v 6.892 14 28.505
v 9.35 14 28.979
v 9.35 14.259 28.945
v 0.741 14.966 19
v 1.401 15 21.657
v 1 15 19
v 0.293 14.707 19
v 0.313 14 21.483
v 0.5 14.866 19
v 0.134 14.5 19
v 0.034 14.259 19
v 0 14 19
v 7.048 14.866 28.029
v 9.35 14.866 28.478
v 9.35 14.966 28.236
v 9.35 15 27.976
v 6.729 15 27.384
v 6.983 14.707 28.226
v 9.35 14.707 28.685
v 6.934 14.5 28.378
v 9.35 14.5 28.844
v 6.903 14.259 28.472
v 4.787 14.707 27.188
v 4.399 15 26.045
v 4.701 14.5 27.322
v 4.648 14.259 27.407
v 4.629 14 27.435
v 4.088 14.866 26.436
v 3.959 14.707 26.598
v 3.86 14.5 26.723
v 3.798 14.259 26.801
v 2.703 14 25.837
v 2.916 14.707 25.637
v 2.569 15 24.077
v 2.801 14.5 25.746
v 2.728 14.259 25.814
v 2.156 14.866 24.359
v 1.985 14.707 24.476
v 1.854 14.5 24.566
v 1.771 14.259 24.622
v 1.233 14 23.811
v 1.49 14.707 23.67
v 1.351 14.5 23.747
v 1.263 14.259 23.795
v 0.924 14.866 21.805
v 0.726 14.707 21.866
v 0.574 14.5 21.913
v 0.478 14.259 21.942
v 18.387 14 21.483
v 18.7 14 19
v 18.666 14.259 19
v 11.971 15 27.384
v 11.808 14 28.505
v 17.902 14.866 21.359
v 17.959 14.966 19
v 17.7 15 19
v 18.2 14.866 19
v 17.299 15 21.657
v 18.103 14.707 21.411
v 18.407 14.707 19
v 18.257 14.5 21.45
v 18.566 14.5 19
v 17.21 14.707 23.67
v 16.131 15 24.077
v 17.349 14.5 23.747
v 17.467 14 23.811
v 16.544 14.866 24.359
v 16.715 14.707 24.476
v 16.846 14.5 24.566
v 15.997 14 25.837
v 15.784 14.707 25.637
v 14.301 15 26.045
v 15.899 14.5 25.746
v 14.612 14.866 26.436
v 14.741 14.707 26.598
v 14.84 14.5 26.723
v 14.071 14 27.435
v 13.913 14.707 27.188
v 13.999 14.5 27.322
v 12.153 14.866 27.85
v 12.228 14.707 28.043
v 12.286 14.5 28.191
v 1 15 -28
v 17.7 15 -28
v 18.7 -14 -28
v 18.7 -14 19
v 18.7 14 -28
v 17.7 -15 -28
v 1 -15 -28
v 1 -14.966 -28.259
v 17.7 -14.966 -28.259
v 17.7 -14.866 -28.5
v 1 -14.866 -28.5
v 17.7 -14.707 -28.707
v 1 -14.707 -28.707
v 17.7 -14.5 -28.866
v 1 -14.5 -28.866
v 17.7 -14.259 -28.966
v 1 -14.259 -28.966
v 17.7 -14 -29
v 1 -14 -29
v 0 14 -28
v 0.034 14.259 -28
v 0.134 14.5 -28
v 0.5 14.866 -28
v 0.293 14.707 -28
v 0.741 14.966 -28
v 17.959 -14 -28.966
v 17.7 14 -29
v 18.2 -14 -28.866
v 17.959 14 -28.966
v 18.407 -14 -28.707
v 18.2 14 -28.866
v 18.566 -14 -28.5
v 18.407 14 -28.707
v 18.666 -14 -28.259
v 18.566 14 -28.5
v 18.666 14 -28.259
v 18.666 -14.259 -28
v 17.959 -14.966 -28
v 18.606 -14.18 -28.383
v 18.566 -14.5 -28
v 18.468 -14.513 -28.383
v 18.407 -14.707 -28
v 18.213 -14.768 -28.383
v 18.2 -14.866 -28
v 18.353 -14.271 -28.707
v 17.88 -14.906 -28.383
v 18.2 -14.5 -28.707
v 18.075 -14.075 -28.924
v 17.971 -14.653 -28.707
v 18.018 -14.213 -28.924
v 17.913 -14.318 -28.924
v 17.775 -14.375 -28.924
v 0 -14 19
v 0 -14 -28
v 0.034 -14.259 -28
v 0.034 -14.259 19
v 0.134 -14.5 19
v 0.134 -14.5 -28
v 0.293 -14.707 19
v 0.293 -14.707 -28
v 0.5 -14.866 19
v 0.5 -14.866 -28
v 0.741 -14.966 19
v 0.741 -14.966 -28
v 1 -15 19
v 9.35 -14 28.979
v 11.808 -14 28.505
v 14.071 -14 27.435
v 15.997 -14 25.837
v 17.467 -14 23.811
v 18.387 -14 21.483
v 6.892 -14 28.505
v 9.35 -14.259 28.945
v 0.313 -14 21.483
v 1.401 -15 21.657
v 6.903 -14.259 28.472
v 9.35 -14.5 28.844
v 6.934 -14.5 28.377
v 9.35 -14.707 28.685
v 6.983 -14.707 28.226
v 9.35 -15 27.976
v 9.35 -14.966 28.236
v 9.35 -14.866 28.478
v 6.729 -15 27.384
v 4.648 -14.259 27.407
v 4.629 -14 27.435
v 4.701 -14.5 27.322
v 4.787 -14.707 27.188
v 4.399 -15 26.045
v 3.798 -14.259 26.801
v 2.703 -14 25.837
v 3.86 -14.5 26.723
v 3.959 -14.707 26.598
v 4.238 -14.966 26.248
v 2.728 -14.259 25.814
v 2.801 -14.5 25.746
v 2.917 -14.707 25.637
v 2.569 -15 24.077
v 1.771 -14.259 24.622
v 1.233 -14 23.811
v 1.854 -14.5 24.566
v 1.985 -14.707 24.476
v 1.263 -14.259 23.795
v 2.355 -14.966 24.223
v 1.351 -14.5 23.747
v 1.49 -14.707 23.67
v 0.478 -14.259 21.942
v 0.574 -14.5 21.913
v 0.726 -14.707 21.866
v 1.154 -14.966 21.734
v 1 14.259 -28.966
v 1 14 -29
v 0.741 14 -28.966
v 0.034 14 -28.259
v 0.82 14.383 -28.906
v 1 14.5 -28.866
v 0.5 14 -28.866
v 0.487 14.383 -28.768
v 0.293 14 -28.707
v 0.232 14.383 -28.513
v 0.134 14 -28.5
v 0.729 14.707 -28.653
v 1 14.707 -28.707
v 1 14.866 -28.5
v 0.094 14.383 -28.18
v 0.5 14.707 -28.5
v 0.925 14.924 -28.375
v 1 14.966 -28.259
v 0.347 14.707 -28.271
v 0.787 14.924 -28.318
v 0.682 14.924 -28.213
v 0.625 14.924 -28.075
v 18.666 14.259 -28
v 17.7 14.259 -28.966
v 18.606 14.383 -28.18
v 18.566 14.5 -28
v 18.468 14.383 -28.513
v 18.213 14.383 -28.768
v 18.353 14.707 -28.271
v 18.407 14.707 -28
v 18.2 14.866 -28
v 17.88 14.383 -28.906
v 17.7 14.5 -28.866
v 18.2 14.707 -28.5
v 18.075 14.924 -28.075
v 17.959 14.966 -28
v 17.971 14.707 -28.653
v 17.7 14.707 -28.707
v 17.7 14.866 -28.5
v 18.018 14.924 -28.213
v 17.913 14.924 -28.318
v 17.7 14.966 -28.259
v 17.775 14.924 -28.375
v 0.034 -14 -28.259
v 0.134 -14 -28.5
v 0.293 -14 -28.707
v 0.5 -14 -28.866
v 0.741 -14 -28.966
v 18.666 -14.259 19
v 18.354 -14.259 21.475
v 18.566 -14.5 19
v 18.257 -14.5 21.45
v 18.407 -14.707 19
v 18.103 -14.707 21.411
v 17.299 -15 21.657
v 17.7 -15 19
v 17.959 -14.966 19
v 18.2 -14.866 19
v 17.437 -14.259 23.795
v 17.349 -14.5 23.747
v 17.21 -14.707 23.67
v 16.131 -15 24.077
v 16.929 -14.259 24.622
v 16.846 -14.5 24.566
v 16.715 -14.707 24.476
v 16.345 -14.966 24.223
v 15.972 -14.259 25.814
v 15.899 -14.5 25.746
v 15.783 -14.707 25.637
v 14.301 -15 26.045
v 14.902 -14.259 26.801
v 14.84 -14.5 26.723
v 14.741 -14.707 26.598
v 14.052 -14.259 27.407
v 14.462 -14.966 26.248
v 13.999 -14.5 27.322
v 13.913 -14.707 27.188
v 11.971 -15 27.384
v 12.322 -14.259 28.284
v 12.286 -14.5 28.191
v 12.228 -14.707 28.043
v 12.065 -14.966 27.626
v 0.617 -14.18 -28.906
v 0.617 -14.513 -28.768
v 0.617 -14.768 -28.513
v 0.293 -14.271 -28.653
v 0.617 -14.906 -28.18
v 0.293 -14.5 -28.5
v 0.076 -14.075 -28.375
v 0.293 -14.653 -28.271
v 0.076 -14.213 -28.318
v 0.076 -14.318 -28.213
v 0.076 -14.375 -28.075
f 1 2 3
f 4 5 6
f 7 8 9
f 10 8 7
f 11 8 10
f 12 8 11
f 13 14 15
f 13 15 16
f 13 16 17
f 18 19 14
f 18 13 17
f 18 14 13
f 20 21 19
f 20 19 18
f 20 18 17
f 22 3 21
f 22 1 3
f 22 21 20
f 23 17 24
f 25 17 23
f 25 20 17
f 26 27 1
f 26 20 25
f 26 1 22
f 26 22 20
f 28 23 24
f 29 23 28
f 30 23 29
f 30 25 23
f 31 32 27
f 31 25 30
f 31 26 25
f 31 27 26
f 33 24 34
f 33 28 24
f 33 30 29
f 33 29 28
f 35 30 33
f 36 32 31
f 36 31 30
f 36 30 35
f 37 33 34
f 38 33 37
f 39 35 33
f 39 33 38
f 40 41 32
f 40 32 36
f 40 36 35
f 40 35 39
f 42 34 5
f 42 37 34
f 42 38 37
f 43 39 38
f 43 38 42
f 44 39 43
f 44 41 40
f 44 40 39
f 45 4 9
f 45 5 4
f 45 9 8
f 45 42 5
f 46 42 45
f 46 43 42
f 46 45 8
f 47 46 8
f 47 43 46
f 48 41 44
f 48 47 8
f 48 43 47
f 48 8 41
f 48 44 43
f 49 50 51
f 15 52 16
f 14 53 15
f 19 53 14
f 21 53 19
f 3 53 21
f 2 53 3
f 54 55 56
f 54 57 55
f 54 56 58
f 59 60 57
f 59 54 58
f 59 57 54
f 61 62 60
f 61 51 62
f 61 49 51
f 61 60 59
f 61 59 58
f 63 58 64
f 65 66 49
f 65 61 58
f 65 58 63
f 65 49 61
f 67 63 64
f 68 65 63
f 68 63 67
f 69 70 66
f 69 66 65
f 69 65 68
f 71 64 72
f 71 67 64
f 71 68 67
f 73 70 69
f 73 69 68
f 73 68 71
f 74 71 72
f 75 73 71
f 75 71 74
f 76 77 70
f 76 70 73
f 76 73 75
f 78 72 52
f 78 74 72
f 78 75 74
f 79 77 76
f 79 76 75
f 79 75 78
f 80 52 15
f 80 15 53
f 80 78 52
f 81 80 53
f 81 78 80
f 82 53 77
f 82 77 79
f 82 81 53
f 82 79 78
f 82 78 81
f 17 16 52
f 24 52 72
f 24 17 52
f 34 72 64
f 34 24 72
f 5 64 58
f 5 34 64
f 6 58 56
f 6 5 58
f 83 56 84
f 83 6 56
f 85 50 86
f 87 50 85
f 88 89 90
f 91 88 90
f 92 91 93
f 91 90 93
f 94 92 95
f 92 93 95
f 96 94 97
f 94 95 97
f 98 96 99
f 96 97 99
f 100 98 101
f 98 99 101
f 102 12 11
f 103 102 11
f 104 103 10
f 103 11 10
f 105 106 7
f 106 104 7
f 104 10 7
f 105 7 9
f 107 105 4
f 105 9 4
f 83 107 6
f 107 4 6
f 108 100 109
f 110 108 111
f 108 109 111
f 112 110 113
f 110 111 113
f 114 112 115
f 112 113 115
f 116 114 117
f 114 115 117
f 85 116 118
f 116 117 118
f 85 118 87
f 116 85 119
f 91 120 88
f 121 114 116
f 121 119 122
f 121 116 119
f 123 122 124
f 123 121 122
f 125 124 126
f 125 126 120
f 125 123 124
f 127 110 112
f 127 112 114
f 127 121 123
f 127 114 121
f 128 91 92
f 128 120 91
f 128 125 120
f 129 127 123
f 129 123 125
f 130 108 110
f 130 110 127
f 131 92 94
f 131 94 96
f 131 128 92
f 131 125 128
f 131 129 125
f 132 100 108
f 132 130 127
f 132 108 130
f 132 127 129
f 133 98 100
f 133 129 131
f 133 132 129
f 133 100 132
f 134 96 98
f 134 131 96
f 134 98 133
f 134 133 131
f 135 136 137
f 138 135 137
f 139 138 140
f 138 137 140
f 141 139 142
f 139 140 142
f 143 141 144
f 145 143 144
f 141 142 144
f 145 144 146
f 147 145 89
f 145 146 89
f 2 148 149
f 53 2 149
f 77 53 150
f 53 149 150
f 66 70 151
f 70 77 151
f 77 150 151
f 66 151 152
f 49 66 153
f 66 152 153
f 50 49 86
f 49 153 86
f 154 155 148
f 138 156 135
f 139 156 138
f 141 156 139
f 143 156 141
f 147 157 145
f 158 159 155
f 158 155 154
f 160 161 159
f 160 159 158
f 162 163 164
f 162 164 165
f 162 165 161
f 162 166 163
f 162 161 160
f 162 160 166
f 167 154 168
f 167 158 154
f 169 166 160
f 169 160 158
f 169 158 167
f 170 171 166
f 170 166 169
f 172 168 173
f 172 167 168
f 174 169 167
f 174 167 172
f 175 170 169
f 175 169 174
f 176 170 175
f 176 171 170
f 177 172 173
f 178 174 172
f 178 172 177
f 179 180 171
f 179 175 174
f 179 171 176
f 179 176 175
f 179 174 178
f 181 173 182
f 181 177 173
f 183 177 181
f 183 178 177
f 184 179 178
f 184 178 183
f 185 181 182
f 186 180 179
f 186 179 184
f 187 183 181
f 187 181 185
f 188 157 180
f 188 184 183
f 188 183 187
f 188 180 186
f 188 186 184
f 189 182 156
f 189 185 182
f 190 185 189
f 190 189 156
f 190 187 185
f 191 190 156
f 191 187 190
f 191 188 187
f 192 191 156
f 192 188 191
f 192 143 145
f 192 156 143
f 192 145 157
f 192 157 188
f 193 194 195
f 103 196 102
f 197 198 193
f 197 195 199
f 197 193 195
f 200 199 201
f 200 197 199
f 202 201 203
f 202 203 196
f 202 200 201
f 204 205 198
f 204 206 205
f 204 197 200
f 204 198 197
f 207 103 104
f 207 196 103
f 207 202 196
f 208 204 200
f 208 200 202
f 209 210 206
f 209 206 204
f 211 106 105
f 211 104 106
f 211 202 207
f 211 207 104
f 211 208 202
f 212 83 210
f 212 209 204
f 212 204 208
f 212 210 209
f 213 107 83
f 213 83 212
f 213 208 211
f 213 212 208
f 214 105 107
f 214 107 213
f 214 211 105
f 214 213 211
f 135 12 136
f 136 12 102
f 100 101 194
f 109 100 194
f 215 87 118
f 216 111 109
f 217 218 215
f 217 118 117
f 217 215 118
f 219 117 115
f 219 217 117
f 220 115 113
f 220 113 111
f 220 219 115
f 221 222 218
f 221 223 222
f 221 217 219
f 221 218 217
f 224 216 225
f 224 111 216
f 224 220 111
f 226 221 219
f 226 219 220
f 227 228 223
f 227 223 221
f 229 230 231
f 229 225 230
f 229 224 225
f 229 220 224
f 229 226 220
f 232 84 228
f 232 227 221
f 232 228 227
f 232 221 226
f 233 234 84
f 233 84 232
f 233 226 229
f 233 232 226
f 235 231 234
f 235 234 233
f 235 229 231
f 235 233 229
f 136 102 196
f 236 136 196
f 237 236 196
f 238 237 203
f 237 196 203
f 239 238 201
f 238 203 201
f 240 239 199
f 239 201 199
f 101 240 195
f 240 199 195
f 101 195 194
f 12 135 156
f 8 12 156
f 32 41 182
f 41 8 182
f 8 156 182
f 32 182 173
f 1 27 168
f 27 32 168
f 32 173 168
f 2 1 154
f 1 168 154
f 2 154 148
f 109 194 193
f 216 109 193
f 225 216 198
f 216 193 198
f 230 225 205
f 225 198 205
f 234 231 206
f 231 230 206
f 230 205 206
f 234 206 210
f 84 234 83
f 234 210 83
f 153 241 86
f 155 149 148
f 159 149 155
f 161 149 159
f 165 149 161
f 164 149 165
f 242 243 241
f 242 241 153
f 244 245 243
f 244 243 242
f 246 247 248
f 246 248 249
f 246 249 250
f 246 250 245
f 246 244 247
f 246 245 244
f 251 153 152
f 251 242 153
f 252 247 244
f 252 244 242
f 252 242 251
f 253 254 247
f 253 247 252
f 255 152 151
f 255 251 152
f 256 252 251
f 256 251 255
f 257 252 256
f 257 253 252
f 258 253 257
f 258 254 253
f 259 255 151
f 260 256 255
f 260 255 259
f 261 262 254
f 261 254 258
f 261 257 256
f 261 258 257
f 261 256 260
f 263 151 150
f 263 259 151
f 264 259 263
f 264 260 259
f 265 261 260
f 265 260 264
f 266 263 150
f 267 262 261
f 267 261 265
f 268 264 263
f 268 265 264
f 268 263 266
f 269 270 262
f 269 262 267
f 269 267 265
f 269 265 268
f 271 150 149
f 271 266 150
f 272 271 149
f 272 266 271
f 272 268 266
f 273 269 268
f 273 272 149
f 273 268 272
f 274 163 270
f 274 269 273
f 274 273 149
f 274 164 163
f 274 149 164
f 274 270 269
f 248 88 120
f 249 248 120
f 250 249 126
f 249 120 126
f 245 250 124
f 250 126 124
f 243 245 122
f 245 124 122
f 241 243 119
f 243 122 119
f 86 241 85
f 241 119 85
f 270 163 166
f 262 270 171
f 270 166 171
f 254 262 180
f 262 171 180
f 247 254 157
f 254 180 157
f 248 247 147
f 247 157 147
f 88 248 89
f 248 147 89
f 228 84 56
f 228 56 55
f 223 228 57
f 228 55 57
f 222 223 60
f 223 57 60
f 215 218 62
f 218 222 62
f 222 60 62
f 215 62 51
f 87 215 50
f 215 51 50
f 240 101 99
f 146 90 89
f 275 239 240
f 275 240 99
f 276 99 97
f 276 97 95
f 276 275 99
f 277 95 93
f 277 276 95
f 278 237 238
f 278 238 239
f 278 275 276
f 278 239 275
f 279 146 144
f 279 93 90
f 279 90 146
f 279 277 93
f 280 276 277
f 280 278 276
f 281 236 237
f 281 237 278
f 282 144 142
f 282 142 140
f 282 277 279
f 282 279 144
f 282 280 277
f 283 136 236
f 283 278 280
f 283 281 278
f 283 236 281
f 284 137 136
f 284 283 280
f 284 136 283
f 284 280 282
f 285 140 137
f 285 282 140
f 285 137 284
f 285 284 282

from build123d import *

# Parameters (mm, degrees)
SKETCH2_W           = 58
SKETCH2_H           = 30
BOSS_EXTRUDE1_DEPTH = 18.7
FILLET1_R           = 10
FILLET2_R           = 1


with BuildPart() as part:
    # Sketch2 → Boss-Extrude1 (new body)
    with BuildSketch(Plane(origin=(0, 0, 0), x_dir=(0, 0, -1), z_dir=(1, 0, 0))):
        Rectangle(SKETCH2_W, SKETCH2_H)
    extrude(amount=BOSS_EXTRUDE1_DEPTH)

    # Fillet1
    # the kernel refuses this fillet: 10 mm, written as the material it takes off along each edge
    with BuildSketch(Plane(origin=(0, -40, 29), x_dir=(1, 0, 0), z_dir=(0, 1, 0))) as fillet1_piece_1:
        with BuildLine():
            CenterArc((FILLET1_R, FILLET1_R), FILLET1_R, 180, 90)
            Line((0, FILLET1_R), (0, 0))
            Line((0, 0), (FILLET1_R, 0))
        make_face()
    extrude(amount=80, mode=Mode.SUBTRACT)
    with BuildSketch(Plane(origin=(18.7, -40, 29), x_dir=(-1, 0, 0), z_dir=(0, 1, 0))) as fillet1_piece_2:
        with BuildLine():
            CenterArc((FILLET1_R, -FILLET1_R), FILLET1_R, 90, 90)
            Line((0, -FILLET1_R), (0, 0))
            Line((0, 0), (FILLET1_R, 0))
        make_face()
    extrude(amount=80, mode=Mode.SUBTRACT)

    # Fillet2
    # the kernel refuses this fillet: 1 mm, written as the material it takes off along each edge
    with BuildSketch(Plane(origin=(1, -14, -28), x_dir=(0, 0, -1), z_dir=(-1, 0, 0))) as fillet2_piece_1_section:
        Polygon((0, 0), (FILLET2_R, 0), (FILLET2_R, FILLET2_R), (0, FILLET2_R), align=None)
    fillet2_piece_1 = extrude(amount=FILLET2_R, mode=Mode.PRIVATE)
    fillet2_piece_1 = fillet2_piece_1 - Plane(origin=(1, -14, -28), x_dir=(0, 0.7071067811865475, 0.7071067811865475), z_dir=(-1, 0, 0)) * Sphere(FILLET2_R, mode=Mode.PRIVATE)
    add(fillet2_piece_1, mode=Mode.SUBTRACT)
    with BuildSketch(Plane(origin=(17.7, -14, -28), x_dir=(1, 0, 0), z_dir=(0, 0, -1))) as fillet2_piece_2_section:
        Polygon((0, 0), (FILLET2_R, 0), (FILLET2_R, FILLET2_R), (0, FILLET2_R), align=None)
    fillet2_piece_2 = extrude(amount=FILLET2_R, mode=Mode.PRIVATE)
    fillet2_piece_2 = fillet2_piece_2 - Plane(origin=(17.7, -14, -28), x_dir=(-0.7071067811865475, 0.7071067811865475, 0), z_dir=(0, 0, -1)) * Sphere(FILLET2_R, mode=Mode.PRIVATE)
    add(fillet2_piece_2, mode=Mode.SUBTRACT)
    with BuildSketch(Plane(origin=(1, 14, -28), x_dir=(-1, 0, 0), z_dir=(0, 1, 0))) as fillet2_piece_3_section:
        Polygon((0, 0), (FILLET2_R, 0), (FILLET2_R, -FILLET2_R), (0, -FILLET2_R), align=None)
    fillet2_piece_3 = extrude(amount=FILLET2_R, mode=Mode.PRIVATE)
    fillet2_piece_3 = fillet2_piece_3 - Plane(origin=(1, 14, -28), x_dir=(0.7071067811865475, 0, 0.7071067811865475), z_dir=(0, 1, 0)) * Sphere(FILLET2_R, mode=Mode.PRIVATE)
    add(fillet2_piece_3, mode=Mode.SUBTRACT)
    with BuildSketch(Plane(origin=(17.7, 14, -28), x_dir=(0, 0, -1), z_dir=(0, 1, 0))) as fillet2_piece_4_section:
        Polygon((0, 0), (FILLET2_R, 0), (FILLET2_R, -FILLET2_R), (0, -FILLET2_R), align=None)
    fillet2_piece_4 = extrude(amount=FILLET2_R, mode=Mode.PRIVATE)
    fillet2_piece_4 = fillet2_piece_4 - Plane(origin=(17.7, 14, -28), x_dir=(-0.7071067811865475, 0, 0.7071067811865475), z_dir=(0, 1, 0)) * Sphere(FILLET2_R, mode=Mode.PRIVATE)
    add(fillet2_piece_4, mode=Mode.SUBTRACT)
    with BuildSketch(Plane(origin=(0, -15, -28), x_dir=(0, 1, 0), z_dir=(0, 0, 1)), Plane(origin=(18.7, 15, 19), x_dir=(-1, 0, 0), z_dir=(0, 0, -1))) as fillet2_piece_5:
        with BuildLine():
            CenterArc((FILLET2_R, -FILLET2_R), FILLET2_R, 90, 90)
            Line((0, -FILLET2_R), (0, 0))
            Line((0, 0), (FILLET2_R, 0))
        make_face()
    extrude(amount=47, mode=Mode.SUBTRACT)
    with BuildSketch(Plane(origin=(18.7, -15, -28), x_dir=(0, 1, 0), z_dir=(0, 0, 1)), Plane(origin=(0, 15, 19), x_dir=(1, 0, 0), z_dir=(0, 0, -1))) as fillet2_piece_6:
        with BuildLine():
            CenterArc((FILLET2_R, FILLET2_R), FILLET2_R, 180, 90)
            Line((0, FILLET2_R), (0, 0))
            Line((0, 0), (FILLET2_R, 0))
        make_face()
    extrude(amount=47, mode=Mode.SUBTRACT)
    with BuildSketch(Plane(origin=(8.7, -15, 19), x_dir=(1, 0, 0), z_dir=(0, 0, -1))) as fillet2_piece_7:
        with BuildLine():
            CenterArc((10 - FILLET2_R, -FILLET2_R), FILLET2_R, 0, 90)
            Line((10 - FILLET2_R, 0), (10, 0))
            Line((10, 0), (10, -FILLET2_R))
        make_face()
    revolve(axis=Axis((8.7, -15, 19), (0, -1, 0)), revolution_arc=100.602378983, mode=Mode.SUBTRACT)
    with BuildSketch(Plane(origin=(10, -15, 19), x_dir=(0.1839921630034736, 0, 0.9829277104412629), z_dir=(0.9829277104412629, 0, -0.1839921630034736))) as fillet2_piece_8:
        with BuildLine():
            CenterArc((10 - FILLET2_R, -FILLET2_R), FILLET2_R, 0, 90)
            Line((10 - FILLET2_R, 0), (10, 0))
            Line((10, 0), (10, -FILLET2_R))
        make_face()
    revolve(axis=Axis((10, -15, 19), (0, -1, 0)), revolution_arc=100.602378983, mode=Mode.SUBTRACT)
    with BuildSketch(Plane(origin=(8.7, 15, 19), x_dir=(1, 0, 0), z_dir=(0, 0, -1))) as fillet2_piece_9:
        with BuildLine():
            CenterArc((10 - FILLET2_R, FILLET2_R), FILLET2_R, 270, 90)
            Line((10, FILLET2_R), (10, 0))
            Line((10, 0), (10 - FILLET2_R, 0))
        make_face()
    revolve(axis=Axis((8.7, 15, 19), (0, -1, 0)), revolution_arc=100.602378983, mode=Mode.SUBTRACT)
    with BuildSketch(Plane(origin=(10, 15, 19), x_dir=(0.1839921630034736, 0, 0.9829277104412629), z_dir=(0.9829277104412629, 0, -0.1839921630034736))) as fillet2_piece_10:
        with BuildLine():
            CenterArc((10 - FILLET2_R, FILLET2_R), FILLET2_R, 270, 90)
            Line((10, FILLET2_R), (10, 0))
            Line((10, 0), (10 - FILLET2_R, 0))
        make_face()
    revolve(axis=Axis((10, 15, 19), (0, -1, 0)), revolution_arc=100.602378983, mode=Mode.SUBTRACT)
    with BuildSketch(Plane(origin=(0, 14, -29), x_dir=(0, 0, 1), z_dir=(0, -1, 0)), Plane(origin=(18.7, 14, -29), x_dir=(-1, 0, 0), z_dir=(0, -1, 0))) as fillet2_piece_11:
        with BuildLine():
            CenterArc((FILLET2_R, -FILLET2_R), FILLET2_R, 90, 90)
            Line((0, -FILLET2_R), (0, 0))
            Line((0, 0), (FILLET2_R, 0))
        make_face()
    extrude(amount=28, mode=Mode.SUBTRACT)
    with BuildSketch(Plane(origin=(1, -15, -29), x_dir=(0, 1, 0), z_dir=(1, 0, 0)), Plane(origin=(1, 15, -29), x_dir=(0, 0, 1), z_dir=(1, 0, 0))) as fillet2_piece_12:
        with BuildLine():
            CenterArc((FILLET2_R, FILLET2_R), FILLET2_R, 180, 90)
            Line((0, FILLET2_R), (0, 0))
            Line((0, 0), (FILLET2_R, 0))
        make_face()
    extrude(amount=16.7, mode=Mode.SUBTRACT)


solid = part.part
